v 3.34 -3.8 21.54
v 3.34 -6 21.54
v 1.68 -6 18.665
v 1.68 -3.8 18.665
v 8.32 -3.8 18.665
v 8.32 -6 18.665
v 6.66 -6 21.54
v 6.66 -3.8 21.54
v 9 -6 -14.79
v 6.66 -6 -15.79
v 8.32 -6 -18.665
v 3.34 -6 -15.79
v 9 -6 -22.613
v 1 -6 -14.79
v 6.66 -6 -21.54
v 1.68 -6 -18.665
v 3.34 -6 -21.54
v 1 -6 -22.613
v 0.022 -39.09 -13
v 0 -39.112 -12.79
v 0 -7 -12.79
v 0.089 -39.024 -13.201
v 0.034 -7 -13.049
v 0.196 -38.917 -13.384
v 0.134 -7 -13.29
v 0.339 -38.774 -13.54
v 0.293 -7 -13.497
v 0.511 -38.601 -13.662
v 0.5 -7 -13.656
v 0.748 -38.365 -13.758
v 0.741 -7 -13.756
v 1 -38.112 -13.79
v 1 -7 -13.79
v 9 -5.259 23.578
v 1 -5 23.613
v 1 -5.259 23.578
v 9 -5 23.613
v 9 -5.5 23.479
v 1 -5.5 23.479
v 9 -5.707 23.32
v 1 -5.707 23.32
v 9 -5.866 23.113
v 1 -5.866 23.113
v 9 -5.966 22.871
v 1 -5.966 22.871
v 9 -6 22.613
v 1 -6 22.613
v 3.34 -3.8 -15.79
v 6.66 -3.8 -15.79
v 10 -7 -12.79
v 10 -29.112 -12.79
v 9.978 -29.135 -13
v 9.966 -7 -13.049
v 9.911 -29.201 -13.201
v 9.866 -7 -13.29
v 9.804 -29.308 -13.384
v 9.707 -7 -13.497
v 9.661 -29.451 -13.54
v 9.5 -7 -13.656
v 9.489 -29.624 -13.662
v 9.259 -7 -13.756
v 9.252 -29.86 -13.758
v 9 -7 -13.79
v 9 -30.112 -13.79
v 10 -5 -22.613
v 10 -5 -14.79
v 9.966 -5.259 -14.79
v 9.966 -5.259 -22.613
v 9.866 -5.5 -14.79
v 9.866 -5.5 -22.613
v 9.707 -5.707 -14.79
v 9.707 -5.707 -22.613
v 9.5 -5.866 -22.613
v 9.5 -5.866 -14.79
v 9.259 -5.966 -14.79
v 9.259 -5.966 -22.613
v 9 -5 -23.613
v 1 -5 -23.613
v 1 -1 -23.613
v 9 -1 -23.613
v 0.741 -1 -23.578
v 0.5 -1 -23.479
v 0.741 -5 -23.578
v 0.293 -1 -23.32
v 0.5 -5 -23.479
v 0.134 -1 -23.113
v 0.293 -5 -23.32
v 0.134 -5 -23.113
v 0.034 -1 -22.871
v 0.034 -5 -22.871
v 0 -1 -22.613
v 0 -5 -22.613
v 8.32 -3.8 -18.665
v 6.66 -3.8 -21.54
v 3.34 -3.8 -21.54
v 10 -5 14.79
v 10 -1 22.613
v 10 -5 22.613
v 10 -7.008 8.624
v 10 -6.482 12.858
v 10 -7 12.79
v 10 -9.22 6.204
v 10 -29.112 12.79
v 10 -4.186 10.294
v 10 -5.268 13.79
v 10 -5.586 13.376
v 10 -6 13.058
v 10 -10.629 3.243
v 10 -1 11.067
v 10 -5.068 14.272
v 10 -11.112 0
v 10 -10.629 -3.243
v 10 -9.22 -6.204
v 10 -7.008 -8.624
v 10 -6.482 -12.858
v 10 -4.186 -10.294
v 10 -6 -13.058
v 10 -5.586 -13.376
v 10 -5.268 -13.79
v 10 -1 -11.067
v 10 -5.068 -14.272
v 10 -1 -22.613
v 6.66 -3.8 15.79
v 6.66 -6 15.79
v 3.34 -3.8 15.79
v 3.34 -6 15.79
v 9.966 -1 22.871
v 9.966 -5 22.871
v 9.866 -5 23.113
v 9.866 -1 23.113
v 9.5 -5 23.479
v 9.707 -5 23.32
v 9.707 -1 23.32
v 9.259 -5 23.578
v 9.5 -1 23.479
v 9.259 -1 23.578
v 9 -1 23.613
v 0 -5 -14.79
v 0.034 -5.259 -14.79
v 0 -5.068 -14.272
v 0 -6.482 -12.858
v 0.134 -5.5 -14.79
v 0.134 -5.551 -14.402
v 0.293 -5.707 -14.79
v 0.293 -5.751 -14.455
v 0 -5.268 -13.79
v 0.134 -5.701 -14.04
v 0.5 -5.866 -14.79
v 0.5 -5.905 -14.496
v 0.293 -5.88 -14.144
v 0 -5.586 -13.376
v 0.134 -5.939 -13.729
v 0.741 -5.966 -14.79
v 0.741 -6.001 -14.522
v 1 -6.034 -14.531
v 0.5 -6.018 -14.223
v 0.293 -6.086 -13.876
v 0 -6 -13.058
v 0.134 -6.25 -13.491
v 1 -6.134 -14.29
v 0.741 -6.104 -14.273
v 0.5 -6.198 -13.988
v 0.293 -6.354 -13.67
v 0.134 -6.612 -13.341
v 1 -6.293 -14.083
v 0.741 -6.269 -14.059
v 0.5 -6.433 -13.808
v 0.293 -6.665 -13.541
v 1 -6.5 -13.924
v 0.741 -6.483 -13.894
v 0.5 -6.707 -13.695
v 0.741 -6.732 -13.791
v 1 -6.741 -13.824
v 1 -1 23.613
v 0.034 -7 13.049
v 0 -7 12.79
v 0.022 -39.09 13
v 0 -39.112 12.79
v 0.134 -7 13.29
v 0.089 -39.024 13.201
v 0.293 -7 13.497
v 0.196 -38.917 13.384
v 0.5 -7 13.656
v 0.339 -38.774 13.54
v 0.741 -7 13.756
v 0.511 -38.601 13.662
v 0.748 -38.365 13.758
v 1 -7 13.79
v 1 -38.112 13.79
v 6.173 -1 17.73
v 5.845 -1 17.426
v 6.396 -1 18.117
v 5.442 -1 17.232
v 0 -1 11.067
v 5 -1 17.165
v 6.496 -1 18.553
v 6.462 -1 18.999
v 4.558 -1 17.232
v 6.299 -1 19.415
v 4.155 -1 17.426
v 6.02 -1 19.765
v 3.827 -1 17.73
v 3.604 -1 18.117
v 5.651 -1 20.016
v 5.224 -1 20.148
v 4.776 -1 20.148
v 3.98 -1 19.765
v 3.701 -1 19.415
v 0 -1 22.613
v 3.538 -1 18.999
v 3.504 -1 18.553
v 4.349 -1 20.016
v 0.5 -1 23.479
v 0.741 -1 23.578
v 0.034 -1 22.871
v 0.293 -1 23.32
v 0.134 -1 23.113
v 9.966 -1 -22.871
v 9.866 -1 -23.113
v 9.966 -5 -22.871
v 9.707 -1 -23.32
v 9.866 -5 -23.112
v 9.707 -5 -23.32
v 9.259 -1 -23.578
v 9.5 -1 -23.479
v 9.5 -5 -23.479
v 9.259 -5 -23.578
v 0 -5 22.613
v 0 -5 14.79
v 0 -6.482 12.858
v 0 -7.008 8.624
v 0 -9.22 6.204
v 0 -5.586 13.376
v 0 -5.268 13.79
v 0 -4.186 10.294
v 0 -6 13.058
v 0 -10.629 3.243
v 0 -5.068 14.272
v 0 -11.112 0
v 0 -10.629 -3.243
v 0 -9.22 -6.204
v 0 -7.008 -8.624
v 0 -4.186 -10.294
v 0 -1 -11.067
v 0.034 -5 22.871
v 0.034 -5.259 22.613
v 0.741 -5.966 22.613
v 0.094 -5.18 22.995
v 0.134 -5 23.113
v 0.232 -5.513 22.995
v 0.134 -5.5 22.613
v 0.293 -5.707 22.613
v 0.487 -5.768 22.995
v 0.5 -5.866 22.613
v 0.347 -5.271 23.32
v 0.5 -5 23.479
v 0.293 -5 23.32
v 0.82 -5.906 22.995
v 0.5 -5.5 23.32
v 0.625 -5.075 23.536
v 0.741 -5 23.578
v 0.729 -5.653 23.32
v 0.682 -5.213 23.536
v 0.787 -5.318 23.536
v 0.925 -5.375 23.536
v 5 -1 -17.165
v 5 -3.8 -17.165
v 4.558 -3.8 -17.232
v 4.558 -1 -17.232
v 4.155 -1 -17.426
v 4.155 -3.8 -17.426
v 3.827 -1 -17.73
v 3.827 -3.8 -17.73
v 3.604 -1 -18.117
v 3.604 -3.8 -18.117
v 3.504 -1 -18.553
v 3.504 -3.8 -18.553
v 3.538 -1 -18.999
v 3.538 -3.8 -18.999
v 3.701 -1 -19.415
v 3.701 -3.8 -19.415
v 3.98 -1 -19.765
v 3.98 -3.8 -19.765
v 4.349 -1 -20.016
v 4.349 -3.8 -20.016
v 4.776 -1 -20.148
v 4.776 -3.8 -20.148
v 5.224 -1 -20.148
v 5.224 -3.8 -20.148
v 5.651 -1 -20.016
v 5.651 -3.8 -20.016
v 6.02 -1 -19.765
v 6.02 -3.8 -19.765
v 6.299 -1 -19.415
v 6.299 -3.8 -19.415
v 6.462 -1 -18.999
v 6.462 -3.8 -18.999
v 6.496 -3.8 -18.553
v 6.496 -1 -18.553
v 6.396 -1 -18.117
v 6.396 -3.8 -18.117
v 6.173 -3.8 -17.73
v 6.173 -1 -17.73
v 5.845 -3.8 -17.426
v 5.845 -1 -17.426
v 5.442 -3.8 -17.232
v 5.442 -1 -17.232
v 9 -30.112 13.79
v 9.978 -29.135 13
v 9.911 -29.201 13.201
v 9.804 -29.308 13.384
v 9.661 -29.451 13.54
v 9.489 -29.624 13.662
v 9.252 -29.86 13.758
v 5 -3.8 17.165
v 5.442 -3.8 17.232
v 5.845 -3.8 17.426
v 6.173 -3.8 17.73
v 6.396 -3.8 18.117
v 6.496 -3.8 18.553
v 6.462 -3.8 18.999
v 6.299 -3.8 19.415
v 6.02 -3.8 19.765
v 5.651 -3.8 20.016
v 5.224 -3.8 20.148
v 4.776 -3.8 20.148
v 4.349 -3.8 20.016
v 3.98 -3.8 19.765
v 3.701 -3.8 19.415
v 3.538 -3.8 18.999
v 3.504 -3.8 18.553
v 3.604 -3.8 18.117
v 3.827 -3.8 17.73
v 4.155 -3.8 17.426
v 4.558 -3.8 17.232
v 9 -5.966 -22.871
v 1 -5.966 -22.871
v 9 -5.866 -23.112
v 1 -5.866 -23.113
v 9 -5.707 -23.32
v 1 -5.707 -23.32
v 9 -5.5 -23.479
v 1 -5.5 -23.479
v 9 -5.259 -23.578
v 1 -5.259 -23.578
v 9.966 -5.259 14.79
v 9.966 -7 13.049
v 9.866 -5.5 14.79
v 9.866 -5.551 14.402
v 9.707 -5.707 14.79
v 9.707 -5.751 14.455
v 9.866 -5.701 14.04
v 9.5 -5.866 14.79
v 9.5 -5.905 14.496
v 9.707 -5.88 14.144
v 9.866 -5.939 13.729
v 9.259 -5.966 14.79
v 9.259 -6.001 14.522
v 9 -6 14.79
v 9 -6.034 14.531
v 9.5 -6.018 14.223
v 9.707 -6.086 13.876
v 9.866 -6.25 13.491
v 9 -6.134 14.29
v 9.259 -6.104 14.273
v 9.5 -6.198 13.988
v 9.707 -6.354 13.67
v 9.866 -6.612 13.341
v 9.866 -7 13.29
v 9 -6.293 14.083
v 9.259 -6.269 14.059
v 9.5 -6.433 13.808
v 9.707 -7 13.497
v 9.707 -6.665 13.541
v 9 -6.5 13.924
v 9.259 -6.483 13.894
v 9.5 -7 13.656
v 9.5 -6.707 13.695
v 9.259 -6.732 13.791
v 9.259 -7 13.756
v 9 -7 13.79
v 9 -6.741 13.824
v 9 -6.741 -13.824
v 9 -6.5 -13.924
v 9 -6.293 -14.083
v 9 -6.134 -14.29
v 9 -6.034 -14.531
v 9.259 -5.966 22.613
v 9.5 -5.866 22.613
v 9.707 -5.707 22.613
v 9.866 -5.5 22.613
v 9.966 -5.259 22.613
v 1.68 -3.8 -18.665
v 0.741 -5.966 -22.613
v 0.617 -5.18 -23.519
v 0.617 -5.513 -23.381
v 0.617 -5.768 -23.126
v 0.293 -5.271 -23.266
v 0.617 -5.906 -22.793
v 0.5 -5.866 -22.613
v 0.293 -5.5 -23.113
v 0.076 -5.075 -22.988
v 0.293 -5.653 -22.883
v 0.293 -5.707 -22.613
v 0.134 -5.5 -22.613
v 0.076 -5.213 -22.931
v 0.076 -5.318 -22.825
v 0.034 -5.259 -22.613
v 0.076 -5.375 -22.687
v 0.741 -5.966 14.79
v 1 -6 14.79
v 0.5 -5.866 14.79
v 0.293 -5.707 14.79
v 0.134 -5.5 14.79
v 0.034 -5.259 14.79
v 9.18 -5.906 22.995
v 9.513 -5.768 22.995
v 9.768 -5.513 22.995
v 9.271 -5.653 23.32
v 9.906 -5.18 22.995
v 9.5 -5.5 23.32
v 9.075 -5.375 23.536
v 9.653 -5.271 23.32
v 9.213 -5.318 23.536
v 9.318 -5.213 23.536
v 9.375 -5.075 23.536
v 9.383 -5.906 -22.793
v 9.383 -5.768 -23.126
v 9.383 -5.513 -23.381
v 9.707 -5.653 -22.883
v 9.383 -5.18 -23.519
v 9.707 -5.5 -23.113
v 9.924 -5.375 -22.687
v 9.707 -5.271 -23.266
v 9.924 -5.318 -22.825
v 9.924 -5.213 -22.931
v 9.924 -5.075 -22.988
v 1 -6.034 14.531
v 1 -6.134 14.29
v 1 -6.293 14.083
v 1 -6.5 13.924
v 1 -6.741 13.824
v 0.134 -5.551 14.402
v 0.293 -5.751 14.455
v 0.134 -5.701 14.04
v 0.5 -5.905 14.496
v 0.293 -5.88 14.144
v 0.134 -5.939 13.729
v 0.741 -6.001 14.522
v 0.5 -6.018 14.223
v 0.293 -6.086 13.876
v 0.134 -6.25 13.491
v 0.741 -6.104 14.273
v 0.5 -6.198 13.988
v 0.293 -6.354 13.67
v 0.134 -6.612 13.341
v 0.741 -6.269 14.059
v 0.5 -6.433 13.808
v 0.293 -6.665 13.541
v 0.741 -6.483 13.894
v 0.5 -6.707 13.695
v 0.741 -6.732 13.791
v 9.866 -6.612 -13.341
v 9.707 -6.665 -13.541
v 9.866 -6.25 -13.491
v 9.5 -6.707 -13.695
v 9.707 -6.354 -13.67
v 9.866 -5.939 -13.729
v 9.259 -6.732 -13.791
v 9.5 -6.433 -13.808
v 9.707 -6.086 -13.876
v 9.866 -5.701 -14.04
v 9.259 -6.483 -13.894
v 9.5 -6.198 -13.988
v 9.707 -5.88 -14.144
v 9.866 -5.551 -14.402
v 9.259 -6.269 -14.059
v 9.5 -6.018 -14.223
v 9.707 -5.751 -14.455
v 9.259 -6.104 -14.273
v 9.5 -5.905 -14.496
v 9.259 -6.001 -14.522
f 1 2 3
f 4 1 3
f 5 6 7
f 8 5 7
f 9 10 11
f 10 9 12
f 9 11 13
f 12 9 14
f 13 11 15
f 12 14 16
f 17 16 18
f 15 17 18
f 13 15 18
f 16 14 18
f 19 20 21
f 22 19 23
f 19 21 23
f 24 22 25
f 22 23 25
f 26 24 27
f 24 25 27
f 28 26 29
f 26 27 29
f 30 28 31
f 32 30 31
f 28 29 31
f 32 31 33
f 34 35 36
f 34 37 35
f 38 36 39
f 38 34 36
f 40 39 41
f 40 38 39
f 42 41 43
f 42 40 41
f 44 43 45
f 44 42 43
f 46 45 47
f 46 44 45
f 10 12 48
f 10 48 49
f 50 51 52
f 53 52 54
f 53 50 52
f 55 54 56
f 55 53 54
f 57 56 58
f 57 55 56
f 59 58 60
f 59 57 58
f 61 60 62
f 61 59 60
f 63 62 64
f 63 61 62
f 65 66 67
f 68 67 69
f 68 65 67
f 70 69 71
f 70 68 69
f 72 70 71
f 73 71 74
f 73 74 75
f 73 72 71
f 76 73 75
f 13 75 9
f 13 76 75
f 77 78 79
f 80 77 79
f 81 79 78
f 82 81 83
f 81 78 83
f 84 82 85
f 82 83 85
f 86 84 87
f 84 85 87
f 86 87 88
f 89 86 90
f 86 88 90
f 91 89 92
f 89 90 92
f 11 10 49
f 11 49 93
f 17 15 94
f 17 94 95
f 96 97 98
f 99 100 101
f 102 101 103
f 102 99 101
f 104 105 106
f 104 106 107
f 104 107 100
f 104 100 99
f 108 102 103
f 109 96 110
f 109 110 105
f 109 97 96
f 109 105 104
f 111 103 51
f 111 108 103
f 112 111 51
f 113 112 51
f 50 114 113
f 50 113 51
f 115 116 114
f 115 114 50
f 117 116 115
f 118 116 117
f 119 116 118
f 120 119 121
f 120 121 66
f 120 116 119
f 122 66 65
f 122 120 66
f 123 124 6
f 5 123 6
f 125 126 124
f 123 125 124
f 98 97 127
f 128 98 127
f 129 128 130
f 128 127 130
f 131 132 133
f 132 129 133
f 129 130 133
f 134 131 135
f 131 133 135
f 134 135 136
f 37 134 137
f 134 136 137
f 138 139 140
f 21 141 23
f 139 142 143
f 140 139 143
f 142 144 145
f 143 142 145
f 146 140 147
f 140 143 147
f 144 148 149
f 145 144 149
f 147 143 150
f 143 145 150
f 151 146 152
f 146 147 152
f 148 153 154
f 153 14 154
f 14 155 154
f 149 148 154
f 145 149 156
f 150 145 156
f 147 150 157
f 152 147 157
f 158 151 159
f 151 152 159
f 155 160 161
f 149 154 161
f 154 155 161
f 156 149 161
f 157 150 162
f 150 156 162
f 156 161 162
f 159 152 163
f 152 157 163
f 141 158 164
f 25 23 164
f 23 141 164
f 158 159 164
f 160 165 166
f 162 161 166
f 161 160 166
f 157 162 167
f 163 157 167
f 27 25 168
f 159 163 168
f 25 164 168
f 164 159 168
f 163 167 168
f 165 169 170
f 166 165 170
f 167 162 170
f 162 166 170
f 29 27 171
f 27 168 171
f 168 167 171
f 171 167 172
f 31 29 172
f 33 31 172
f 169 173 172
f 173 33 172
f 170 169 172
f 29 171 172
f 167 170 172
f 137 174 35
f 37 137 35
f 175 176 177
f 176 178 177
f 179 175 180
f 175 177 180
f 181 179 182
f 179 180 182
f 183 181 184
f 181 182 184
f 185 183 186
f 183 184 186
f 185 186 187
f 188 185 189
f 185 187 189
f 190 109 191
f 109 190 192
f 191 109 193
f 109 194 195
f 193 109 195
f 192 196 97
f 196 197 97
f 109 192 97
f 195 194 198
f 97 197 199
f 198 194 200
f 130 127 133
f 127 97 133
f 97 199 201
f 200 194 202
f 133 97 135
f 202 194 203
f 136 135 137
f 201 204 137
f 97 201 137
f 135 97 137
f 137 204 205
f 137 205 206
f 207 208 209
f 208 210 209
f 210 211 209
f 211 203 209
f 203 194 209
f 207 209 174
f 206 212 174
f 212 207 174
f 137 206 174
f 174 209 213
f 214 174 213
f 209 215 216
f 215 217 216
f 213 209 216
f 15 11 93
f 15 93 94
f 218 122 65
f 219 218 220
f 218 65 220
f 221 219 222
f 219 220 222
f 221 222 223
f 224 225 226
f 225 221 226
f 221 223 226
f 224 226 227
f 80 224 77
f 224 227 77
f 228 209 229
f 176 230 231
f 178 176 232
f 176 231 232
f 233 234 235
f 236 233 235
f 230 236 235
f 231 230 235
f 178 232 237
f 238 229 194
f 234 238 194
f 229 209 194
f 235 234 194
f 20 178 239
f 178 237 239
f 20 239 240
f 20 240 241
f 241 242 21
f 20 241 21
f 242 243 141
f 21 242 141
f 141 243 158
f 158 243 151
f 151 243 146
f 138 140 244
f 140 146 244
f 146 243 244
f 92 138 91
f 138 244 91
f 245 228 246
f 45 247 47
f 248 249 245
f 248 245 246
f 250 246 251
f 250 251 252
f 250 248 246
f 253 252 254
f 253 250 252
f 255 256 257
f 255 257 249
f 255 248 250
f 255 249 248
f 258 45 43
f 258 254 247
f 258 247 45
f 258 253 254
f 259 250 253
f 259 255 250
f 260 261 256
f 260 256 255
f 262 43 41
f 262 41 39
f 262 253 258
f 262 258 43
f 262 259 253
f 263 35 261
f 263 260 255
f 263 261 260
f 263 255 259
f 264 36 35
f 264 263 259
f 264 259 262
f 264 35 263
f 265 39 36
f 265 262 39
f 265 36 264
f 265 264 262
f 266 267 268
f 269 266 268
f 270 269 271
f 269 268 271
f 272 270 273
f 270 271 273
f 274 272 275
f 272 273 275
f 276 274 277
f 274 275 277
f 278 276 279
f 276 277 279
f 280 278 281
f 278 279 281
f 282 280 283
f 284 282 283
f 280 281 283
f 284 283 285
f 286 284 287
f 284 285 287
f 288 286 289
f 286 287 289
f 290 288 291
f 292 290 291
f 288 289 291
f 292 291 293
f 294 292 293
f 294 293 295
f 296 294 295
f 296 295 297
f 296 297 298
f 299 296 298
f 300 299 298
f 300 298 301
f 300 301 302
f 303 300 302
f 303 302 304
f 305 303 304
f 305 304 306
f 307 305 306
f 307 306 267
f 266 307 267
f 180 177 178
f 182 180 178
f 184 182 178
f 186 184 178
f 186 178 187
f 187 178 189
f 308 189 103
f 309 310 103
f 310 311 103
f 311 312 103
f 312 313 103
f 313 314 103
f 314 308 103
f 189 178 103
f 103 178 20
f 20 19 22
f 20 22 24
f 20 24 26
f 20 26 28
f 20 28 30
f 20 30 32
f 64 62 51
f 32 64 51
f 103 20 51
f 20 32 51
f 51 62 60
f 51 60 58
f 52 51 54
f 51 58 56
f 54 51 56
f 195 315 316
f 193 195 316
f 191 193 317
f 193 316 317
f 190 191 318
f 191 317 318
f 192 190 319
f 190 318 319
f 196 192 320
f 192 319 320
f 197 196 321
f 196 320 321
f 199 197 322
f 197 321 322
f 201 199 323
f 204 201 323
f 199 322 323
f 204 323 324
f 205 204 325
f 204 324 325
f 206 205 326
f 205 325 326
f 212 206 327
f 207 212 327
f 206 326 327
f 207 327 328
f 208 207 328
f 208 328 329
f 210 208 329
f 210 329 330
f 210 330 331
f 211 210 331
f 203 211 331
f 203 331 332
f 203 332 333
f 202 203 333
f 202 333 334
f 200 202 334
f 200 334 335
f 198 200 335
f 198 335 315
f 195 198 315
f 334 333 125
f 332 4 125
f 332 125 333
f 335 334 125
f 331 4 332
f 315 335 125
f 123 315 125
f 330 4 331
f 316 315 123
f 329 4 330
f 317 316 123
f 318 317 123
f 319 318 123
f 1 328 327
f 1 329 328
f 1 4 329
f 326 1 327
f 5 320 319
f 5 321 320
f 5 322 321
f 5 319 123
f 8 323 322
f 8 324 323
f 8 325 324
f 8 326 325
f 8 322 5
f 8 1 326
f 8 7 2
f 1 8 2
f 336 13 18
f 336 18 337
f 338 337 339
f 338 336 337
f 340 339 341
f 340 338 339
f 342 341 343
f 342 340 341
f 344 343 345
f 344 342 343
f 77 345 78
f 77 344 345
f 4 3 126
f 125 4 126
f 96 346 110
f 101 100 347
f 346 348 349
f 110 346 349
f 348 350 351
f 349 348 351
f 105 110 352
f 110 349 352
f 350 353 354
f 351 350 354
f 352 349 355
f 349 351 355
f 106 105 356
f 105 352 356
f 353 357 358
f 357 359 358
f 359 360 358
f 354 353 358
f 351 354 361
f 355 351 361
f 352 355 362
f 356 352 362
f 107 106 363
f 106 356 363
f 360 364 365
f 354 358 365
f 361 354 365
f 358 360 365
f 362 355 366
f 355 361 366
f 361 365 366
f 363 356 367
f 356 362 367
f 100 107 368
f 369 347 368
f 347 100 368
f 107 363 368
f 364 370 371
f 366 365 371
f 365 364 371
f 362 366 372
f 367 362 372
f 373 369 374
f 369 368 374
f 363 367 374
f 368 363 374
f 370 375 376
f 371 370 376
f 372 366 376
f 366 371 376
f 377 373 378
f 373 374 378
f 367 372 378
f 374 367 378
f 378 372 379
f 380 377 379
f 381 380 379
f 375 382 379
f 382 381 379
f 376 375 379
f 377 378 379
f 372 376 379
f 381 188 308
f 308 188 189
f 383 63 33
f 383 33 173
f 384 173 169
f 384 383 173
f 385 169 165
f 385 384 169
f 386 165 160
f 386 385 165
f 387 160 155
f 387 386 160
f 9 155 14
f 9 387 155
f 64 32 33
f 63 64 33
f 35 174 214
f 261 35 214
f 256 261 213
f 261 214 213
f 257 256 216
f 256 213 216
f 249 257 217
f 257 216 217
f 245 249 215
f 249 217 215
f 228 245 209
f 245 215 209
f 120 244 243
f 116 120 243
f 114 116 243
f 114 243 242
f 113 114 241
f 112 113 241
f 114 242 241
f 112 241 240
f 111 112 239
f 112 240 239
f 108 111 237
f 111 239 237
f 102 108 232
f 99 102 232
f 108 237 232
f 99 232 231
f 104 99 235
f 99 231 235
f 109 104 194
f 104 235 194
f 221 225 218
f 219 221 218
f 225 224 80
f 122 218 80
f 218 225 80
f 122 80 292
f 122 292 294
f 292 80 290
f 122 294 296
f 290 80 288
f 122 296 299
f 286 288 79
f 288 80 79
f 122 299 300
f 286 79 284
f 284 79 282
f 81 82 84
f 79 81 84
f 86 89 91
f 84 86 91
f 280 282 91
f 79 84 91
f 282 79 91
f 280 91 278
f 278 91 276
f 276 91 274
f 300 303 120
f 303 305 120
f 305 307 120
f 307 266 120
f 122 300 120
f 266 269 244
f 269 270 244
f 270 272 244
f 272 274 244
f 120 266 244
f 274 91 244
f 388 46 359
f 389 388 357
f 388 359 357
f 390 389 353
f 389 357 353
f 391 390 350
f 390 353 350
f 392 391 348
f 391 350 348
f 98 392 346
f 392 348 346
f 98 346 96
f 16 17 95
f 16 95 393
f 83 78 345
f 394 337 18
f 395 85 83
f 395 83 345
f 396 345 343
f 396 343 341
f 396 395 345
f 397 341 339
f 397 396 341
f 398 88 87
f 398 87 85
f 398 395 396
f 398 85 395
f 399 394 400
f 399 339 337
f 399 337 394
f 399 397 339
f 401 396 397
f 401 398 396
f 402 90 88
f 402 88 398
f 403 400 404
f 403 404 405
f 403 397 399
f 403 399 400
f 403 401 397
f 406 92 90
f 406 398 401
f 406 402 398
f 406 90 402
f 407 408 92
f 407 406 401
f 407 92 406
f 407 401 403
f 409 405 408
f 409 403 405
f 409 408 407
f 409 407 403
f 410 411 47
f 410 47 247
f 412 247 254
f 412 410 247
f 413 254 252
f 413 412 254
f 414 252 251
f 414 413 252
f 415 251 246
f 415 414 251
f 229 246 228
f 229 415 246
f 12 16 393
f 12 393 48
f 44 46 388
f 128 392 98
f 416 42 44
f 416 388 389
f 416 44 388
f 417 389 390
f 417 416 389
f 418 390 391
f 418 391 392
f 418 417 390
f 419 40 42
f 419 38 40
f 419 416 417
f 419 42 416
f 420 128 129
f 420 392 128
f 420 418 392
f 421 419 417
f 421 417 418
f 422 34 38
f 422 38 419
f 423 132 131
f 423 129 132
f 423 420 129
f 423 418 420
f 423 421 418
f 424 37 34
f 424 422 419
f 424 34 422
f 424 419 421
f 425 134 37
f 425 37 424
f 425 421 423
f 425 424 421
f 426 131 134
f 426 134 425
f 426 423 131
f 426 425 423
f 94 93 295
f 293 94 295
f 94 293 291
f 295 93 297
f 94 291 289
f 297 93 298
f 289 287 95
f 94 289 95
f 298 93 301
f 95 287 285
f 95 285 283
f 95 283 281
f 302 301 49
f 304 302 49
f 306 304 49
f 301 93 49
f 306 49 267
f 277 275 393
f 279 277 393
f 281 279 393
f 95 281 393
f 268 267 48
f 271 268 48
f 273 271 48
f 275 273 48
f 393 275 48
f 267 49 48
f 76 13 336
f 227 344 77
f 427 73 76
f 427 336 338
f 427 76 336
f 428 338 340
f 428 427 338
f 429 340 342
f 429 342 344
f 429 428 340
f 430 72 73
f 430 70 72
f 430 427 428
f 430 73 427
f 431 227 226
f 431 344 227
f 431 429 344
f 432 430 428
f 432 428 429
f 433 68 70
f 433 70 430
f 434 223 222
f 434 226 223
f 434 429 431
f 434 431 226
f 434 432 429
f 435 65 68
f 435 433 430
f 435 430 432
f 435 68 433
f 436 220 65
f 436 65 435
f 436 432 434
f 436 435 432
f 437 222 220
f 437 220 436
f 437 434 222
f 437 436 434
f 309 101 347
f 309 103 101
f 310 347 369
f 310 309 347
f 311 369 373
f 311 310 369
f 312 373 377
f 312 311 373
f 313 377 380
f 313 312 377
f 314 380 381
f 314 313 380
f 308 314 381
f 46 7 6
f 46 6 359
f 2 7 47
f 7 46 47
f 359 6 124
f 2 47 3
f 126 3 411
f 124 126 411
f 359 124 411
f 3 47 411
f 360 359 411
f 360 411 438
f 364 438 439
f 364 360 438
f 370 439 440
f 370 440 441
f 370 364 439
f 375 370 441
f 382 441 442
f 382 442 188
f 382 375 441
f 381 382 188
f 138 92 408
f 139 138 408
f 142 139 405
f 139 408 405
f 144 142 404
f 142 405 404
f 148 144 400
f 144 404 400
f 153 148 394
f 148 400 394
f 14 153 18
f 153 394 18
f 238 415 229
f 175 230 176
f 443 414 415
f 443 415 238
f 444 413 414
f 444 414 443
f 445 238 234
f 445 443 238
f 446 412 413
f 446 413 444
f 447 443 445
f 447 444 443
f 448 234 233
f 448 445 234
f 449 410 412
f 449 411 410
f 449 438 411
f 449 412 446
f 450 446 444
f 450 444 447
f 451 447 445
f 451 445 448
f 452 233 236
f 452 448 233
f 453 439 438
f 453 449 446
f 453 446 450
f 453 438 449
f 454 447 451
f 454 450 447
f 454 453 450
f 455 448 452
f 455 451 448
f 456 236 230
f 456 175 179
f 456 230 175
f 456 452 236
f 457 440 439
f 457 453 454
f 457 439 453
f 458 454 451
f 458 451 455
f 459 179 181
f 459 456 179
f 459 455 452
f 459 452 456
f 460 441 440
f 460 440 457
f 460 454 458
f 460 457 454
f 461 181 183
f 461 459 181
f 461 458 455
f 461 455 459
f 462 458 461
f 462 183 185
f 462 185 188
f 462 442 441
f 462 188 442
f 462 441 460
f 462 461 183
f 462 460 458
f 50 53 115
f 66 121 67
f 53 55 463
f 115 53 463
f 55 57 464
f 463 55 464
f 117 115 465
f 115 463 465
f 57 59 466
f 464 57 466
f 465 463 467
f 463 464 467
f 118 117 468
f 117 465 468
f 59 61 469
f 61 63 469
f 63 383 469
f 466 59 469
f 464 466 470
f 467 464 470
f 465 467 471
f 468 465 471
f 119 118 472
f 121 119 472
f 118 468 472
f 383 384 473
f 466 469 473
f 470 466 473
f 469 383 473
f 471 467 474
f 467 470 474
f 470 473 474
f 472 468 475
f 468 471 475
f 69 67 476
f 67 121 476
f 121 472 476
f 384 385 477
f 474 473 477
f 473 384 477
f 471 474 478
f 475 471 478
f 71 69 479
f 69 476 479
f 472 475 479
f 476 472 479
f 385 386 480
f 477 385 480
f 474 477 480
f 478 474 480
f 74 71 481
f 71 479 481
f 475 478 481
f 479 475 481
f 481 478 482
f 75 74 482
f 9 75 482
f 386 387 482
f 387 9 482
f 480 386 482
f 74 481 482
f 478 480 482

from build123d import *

# Parameters (mm, degrees)
CLAMP_EXTRUDE_DEPTH = 10
CUT_EXTRUDE3_DEPTH  = 56.03390543
FILLET2_R           = 1
FILLET3_R           = 1
CUT_EXTRUDE4_DEPTH  = 2.2
HOLE_5_R            = 1.5
CUT_EXTRUDE5_DEPTH  = 42.880637682


with BuildPart() as part:
    # Sketch4 → Clamp Extrude (new body)
    with BuildSketch(Plane(origin=(0, 0, 0), x_dir=(0, 0, -1), z_dir=(1, 0, 0))):
        with BuildLine():
            Line((-23.612500003, -1), (-23.612500003, -6))
            Line((-23.612500003, -6), (-13.789947652, -6))
            Line((-13.789947652, -6), (-13.789947652, -39.1125))
            Line((-13.789947652, -39.1125), (13.789947652, -39.1125))
            Line((13.789947652, -39.1125), (13.789947652, -6))
            Line((13.789947652, -6), (23.612500003, -6))
            Line((23.612500003, -6), (23.612500003, -1))
            Line((23.612500003, -1), (11.067414163, -1))
            ThreePointArc((11.067414163, -1), (0, -11.1125), (-11.067414163, -1))
            Line((-11.067414163, -1), (-23.612500003, -1))
        make_face()
    extrude(amount=CLAMP_EXTRUDE_DEPTH)

    # Sketch10 → Cut-Extrude3 (cut, through all)
    with BuildSketch(Plane(origin=(0, 0, -13.789947652), x_dir=(-1, 0, 0), z_dir=(0, 0, -1))):
        Polygon((0, -39.1125), (-10, -29.1125), (-10, -39.1125), align=None)
    extrude(amount=-CUT_EXTRUDE3_DEPTH, mode=Mode.SUBTRACT)

    # Fillet2
    fillet2_edges = [part.edges().sort_by_distance(p)[0] for p in [
        (0, -6, 18.701223827),
        (0, -6, -18.701223827),
        (0, -22.55625, -13.789947652),
        (0, -22.55625, 13.789947652),
        (10, -6, -18.701223827),
        (5, -6, 13.789947652),
        (5, -6, 23.612500003),
        (5, -6, -23.612500003),
        (5, -6, -13.789947652),
        (10, -17.55625, -13.789947652),
        (10, -6, 18.701223827),
        (10, -17.55625, 13.789947652),
    ]]
    fillet(fillet2_edges, radius=FILLET2_R)

    # Fillet3
    # the kernel refuses this fillet: 1 mm, written as the material it takes off along each edge
    with BuildSketch(Plane(origin=(1, -5, 22.612500003), x_dir=(-1, 0, 0), z_dir=(0, 0, 1))) as fillet3_piece_1_section:
        Polygon((0, 0), (FILLET3_R, 0), (FILLET3_R, FILLET3_R), (0, FILLET3_R), align=None)
    fillet3_piece_1 = extrude(amount=FILLET3_R, mode=Mode.PRIVATE)
    fillet3_piece_1 = fillet3_piece_1 - Plane(origin=(1, -5, 22.612500003), x_dir=(0.7071067811865475, 0.7071067811865475, 0), z_dir=(0, 0, 1)) * Sphere(FILLET3_R, mode=Mode.PRIVATE)
    add(fillet3_piece_1, mode=Mode.SUBTRACT)
    with BuildSketch(Plane(origin=(9, -5, 22.612500003), x_dir=(1, 0, 0), z_dir=(0, 0, 1))) as fillet3_piece_2_section:
        Polygon((0, 0), (FILLET3_R, 0), (FILLET3_R, -FILLET3_R), (0, -FILLET3_R), align=None)
    fillet3_piece_2 = extrude(amount=FILLET3_R, mode=Mode.PRIVATE)
    fillet3_piece_2 = fillet3_piece_2 - Plane(origin=(9, -5, 22.612500003), x_dir=(-0.7071067811865475, 0.7071067811865475, 0), z_dir=(0, 0, 1)) * Sphere(FILLET3_R, mode=Mode.PRIVATE)
    add(fillet3_piece_2, mode=Mode.SUBTRACT)
    with BuildSketch(Plane(origin=(9, -5, -22.612500003), x_dir=(0, 0, -1), z_dir=(1, 0, 0))) as fillet3_piece_3_section:
        Polygon((0, 0), (FILLET3_R, 0), (FILLET3_R, -FILLET3_R), (0, -FILLET3_R), align=None)
    fillet3_piece_3 = extrude(amount=FILLET3_R, mode=Mode.PRIVATE)
    fillet3_piece_3 = fillet3_piece_3 - Plane(origin=(9, -5, -22.612500003), x_dir=(0, 0.7071067811865475, 0.7071067811865475), z_dir=(1, 0, 0)) * Sphere(FILLET3_R, mode=Mode.PRIVATE)
    add(fillet3_piece_3, mode=Mode.SUBTRACT)
    with BuildSketch(Plane(origin=(1, -5, -22.612500003), x_dir=(0, 0, -1), z_dir=(-1, 0, 0))) as fillet3_piece_4_section:
        Polygon((0, 0), (FILLET3_R, 0), (FILLET3_R, FILLET3_R), (0, FILLET3_R), align=None)
    fillet3_piece_4 = extrude(amount=FILLET3_R, mode=Mode.PRIVATE)
    fillet3_piece_4 = fillet3_piece_4 - Plane(origin=(1, -5, -22.612500003), x_dir=(0, 0.7071067811865475, 0.7071067811865475), z_dir=(-1, 0, 0)) * Sphere(FILLET3_R, mode=Mode.PRIVATE)
    add(fillet3_piece_4, mode=Mode.SUBTRACT)
    with BuildSketch(Plane(origin=(0, 1.5, 23.612500003), x_dir=(1, 0, 0), z_dir=(0, -1, 0)), Plane(origin=(10, -5, -23.612500003), x_dir=(0, 0, 1), z_dir=(0, 1, 0))) as fillet3_piece_5:
        with BuildLine():
            CenterArc((FILLET3_R, -FILLET3_R), FILLET3_R, 90, 90)
            Line((0, -FILLET3_R), (0, 0))
            Line((0, 0), (FILLET3_R, 0))
        make_face()
    extrude(amount=6.5, mode=Mode.SUBTRACT)
    with BuildSketch(Plane(origin=(10, 1.5, 23.612500003), x_dir=(-1, 0, 0), z_dir=(0, -1, 0)), Plane(origin=(0, -5, -23.612500003), x_dir=(0, 0, 1), z_dir=(0, 1, 0))) as fillet3_piece_6:
        with BuildLine():
            CenterArc((FILLET3_R, FILLET3_R), FILLET3_R, 180, 90)
            Line((0, FILLET3_R), (0, 0))
            Line((0, 0), (FILLET3_R, 0))
        make_face()
    extrude(amount=6.5, mode=Mode.SUBTRACT)

    # Hole → Cut-Extrude4 (cut)
    with BuildSketch(Plane.XZ.offset(6)):
        Polygon((8.319764048, 18.664947652), (6.659882024, 21.539947652), (3.340117976, 21.539947652), (1.680235952, 18.664947652), (3.340117976, 15.789947652), (6.659882024, 15.789947652), align=None)
        Polygon((6.659882024, -15.789947652), (8.319764048, -18.664947652), (6.659882024, -21.539947652), (3.340117976, -21.539947652), (1.680235952, -18.664947652), (3.340117976, -15.789947652), align=None)
    extrude(amount=-CUT_EXTRUDE4_DEPTH, mode=Mode.SUBTRACT)

    # Hole<5> → Cut-Extrude5 (cut, through all)
    with BuildSketch(Plane.XZ.offset(6)):
        with Locations(Location((5, 18.664947652, 0), (0, 0, 270))):
            Circle(HOLE_5_R)
        with Locations(Location((5, -18.664947652, 0), (0, 0, 90))):
            Circle(HOLE_5_R)
    extrude(amount=-CUT_EXTRUDE5_DEPTH, mode=Mode.SUBTRACT)


solid = part.part
